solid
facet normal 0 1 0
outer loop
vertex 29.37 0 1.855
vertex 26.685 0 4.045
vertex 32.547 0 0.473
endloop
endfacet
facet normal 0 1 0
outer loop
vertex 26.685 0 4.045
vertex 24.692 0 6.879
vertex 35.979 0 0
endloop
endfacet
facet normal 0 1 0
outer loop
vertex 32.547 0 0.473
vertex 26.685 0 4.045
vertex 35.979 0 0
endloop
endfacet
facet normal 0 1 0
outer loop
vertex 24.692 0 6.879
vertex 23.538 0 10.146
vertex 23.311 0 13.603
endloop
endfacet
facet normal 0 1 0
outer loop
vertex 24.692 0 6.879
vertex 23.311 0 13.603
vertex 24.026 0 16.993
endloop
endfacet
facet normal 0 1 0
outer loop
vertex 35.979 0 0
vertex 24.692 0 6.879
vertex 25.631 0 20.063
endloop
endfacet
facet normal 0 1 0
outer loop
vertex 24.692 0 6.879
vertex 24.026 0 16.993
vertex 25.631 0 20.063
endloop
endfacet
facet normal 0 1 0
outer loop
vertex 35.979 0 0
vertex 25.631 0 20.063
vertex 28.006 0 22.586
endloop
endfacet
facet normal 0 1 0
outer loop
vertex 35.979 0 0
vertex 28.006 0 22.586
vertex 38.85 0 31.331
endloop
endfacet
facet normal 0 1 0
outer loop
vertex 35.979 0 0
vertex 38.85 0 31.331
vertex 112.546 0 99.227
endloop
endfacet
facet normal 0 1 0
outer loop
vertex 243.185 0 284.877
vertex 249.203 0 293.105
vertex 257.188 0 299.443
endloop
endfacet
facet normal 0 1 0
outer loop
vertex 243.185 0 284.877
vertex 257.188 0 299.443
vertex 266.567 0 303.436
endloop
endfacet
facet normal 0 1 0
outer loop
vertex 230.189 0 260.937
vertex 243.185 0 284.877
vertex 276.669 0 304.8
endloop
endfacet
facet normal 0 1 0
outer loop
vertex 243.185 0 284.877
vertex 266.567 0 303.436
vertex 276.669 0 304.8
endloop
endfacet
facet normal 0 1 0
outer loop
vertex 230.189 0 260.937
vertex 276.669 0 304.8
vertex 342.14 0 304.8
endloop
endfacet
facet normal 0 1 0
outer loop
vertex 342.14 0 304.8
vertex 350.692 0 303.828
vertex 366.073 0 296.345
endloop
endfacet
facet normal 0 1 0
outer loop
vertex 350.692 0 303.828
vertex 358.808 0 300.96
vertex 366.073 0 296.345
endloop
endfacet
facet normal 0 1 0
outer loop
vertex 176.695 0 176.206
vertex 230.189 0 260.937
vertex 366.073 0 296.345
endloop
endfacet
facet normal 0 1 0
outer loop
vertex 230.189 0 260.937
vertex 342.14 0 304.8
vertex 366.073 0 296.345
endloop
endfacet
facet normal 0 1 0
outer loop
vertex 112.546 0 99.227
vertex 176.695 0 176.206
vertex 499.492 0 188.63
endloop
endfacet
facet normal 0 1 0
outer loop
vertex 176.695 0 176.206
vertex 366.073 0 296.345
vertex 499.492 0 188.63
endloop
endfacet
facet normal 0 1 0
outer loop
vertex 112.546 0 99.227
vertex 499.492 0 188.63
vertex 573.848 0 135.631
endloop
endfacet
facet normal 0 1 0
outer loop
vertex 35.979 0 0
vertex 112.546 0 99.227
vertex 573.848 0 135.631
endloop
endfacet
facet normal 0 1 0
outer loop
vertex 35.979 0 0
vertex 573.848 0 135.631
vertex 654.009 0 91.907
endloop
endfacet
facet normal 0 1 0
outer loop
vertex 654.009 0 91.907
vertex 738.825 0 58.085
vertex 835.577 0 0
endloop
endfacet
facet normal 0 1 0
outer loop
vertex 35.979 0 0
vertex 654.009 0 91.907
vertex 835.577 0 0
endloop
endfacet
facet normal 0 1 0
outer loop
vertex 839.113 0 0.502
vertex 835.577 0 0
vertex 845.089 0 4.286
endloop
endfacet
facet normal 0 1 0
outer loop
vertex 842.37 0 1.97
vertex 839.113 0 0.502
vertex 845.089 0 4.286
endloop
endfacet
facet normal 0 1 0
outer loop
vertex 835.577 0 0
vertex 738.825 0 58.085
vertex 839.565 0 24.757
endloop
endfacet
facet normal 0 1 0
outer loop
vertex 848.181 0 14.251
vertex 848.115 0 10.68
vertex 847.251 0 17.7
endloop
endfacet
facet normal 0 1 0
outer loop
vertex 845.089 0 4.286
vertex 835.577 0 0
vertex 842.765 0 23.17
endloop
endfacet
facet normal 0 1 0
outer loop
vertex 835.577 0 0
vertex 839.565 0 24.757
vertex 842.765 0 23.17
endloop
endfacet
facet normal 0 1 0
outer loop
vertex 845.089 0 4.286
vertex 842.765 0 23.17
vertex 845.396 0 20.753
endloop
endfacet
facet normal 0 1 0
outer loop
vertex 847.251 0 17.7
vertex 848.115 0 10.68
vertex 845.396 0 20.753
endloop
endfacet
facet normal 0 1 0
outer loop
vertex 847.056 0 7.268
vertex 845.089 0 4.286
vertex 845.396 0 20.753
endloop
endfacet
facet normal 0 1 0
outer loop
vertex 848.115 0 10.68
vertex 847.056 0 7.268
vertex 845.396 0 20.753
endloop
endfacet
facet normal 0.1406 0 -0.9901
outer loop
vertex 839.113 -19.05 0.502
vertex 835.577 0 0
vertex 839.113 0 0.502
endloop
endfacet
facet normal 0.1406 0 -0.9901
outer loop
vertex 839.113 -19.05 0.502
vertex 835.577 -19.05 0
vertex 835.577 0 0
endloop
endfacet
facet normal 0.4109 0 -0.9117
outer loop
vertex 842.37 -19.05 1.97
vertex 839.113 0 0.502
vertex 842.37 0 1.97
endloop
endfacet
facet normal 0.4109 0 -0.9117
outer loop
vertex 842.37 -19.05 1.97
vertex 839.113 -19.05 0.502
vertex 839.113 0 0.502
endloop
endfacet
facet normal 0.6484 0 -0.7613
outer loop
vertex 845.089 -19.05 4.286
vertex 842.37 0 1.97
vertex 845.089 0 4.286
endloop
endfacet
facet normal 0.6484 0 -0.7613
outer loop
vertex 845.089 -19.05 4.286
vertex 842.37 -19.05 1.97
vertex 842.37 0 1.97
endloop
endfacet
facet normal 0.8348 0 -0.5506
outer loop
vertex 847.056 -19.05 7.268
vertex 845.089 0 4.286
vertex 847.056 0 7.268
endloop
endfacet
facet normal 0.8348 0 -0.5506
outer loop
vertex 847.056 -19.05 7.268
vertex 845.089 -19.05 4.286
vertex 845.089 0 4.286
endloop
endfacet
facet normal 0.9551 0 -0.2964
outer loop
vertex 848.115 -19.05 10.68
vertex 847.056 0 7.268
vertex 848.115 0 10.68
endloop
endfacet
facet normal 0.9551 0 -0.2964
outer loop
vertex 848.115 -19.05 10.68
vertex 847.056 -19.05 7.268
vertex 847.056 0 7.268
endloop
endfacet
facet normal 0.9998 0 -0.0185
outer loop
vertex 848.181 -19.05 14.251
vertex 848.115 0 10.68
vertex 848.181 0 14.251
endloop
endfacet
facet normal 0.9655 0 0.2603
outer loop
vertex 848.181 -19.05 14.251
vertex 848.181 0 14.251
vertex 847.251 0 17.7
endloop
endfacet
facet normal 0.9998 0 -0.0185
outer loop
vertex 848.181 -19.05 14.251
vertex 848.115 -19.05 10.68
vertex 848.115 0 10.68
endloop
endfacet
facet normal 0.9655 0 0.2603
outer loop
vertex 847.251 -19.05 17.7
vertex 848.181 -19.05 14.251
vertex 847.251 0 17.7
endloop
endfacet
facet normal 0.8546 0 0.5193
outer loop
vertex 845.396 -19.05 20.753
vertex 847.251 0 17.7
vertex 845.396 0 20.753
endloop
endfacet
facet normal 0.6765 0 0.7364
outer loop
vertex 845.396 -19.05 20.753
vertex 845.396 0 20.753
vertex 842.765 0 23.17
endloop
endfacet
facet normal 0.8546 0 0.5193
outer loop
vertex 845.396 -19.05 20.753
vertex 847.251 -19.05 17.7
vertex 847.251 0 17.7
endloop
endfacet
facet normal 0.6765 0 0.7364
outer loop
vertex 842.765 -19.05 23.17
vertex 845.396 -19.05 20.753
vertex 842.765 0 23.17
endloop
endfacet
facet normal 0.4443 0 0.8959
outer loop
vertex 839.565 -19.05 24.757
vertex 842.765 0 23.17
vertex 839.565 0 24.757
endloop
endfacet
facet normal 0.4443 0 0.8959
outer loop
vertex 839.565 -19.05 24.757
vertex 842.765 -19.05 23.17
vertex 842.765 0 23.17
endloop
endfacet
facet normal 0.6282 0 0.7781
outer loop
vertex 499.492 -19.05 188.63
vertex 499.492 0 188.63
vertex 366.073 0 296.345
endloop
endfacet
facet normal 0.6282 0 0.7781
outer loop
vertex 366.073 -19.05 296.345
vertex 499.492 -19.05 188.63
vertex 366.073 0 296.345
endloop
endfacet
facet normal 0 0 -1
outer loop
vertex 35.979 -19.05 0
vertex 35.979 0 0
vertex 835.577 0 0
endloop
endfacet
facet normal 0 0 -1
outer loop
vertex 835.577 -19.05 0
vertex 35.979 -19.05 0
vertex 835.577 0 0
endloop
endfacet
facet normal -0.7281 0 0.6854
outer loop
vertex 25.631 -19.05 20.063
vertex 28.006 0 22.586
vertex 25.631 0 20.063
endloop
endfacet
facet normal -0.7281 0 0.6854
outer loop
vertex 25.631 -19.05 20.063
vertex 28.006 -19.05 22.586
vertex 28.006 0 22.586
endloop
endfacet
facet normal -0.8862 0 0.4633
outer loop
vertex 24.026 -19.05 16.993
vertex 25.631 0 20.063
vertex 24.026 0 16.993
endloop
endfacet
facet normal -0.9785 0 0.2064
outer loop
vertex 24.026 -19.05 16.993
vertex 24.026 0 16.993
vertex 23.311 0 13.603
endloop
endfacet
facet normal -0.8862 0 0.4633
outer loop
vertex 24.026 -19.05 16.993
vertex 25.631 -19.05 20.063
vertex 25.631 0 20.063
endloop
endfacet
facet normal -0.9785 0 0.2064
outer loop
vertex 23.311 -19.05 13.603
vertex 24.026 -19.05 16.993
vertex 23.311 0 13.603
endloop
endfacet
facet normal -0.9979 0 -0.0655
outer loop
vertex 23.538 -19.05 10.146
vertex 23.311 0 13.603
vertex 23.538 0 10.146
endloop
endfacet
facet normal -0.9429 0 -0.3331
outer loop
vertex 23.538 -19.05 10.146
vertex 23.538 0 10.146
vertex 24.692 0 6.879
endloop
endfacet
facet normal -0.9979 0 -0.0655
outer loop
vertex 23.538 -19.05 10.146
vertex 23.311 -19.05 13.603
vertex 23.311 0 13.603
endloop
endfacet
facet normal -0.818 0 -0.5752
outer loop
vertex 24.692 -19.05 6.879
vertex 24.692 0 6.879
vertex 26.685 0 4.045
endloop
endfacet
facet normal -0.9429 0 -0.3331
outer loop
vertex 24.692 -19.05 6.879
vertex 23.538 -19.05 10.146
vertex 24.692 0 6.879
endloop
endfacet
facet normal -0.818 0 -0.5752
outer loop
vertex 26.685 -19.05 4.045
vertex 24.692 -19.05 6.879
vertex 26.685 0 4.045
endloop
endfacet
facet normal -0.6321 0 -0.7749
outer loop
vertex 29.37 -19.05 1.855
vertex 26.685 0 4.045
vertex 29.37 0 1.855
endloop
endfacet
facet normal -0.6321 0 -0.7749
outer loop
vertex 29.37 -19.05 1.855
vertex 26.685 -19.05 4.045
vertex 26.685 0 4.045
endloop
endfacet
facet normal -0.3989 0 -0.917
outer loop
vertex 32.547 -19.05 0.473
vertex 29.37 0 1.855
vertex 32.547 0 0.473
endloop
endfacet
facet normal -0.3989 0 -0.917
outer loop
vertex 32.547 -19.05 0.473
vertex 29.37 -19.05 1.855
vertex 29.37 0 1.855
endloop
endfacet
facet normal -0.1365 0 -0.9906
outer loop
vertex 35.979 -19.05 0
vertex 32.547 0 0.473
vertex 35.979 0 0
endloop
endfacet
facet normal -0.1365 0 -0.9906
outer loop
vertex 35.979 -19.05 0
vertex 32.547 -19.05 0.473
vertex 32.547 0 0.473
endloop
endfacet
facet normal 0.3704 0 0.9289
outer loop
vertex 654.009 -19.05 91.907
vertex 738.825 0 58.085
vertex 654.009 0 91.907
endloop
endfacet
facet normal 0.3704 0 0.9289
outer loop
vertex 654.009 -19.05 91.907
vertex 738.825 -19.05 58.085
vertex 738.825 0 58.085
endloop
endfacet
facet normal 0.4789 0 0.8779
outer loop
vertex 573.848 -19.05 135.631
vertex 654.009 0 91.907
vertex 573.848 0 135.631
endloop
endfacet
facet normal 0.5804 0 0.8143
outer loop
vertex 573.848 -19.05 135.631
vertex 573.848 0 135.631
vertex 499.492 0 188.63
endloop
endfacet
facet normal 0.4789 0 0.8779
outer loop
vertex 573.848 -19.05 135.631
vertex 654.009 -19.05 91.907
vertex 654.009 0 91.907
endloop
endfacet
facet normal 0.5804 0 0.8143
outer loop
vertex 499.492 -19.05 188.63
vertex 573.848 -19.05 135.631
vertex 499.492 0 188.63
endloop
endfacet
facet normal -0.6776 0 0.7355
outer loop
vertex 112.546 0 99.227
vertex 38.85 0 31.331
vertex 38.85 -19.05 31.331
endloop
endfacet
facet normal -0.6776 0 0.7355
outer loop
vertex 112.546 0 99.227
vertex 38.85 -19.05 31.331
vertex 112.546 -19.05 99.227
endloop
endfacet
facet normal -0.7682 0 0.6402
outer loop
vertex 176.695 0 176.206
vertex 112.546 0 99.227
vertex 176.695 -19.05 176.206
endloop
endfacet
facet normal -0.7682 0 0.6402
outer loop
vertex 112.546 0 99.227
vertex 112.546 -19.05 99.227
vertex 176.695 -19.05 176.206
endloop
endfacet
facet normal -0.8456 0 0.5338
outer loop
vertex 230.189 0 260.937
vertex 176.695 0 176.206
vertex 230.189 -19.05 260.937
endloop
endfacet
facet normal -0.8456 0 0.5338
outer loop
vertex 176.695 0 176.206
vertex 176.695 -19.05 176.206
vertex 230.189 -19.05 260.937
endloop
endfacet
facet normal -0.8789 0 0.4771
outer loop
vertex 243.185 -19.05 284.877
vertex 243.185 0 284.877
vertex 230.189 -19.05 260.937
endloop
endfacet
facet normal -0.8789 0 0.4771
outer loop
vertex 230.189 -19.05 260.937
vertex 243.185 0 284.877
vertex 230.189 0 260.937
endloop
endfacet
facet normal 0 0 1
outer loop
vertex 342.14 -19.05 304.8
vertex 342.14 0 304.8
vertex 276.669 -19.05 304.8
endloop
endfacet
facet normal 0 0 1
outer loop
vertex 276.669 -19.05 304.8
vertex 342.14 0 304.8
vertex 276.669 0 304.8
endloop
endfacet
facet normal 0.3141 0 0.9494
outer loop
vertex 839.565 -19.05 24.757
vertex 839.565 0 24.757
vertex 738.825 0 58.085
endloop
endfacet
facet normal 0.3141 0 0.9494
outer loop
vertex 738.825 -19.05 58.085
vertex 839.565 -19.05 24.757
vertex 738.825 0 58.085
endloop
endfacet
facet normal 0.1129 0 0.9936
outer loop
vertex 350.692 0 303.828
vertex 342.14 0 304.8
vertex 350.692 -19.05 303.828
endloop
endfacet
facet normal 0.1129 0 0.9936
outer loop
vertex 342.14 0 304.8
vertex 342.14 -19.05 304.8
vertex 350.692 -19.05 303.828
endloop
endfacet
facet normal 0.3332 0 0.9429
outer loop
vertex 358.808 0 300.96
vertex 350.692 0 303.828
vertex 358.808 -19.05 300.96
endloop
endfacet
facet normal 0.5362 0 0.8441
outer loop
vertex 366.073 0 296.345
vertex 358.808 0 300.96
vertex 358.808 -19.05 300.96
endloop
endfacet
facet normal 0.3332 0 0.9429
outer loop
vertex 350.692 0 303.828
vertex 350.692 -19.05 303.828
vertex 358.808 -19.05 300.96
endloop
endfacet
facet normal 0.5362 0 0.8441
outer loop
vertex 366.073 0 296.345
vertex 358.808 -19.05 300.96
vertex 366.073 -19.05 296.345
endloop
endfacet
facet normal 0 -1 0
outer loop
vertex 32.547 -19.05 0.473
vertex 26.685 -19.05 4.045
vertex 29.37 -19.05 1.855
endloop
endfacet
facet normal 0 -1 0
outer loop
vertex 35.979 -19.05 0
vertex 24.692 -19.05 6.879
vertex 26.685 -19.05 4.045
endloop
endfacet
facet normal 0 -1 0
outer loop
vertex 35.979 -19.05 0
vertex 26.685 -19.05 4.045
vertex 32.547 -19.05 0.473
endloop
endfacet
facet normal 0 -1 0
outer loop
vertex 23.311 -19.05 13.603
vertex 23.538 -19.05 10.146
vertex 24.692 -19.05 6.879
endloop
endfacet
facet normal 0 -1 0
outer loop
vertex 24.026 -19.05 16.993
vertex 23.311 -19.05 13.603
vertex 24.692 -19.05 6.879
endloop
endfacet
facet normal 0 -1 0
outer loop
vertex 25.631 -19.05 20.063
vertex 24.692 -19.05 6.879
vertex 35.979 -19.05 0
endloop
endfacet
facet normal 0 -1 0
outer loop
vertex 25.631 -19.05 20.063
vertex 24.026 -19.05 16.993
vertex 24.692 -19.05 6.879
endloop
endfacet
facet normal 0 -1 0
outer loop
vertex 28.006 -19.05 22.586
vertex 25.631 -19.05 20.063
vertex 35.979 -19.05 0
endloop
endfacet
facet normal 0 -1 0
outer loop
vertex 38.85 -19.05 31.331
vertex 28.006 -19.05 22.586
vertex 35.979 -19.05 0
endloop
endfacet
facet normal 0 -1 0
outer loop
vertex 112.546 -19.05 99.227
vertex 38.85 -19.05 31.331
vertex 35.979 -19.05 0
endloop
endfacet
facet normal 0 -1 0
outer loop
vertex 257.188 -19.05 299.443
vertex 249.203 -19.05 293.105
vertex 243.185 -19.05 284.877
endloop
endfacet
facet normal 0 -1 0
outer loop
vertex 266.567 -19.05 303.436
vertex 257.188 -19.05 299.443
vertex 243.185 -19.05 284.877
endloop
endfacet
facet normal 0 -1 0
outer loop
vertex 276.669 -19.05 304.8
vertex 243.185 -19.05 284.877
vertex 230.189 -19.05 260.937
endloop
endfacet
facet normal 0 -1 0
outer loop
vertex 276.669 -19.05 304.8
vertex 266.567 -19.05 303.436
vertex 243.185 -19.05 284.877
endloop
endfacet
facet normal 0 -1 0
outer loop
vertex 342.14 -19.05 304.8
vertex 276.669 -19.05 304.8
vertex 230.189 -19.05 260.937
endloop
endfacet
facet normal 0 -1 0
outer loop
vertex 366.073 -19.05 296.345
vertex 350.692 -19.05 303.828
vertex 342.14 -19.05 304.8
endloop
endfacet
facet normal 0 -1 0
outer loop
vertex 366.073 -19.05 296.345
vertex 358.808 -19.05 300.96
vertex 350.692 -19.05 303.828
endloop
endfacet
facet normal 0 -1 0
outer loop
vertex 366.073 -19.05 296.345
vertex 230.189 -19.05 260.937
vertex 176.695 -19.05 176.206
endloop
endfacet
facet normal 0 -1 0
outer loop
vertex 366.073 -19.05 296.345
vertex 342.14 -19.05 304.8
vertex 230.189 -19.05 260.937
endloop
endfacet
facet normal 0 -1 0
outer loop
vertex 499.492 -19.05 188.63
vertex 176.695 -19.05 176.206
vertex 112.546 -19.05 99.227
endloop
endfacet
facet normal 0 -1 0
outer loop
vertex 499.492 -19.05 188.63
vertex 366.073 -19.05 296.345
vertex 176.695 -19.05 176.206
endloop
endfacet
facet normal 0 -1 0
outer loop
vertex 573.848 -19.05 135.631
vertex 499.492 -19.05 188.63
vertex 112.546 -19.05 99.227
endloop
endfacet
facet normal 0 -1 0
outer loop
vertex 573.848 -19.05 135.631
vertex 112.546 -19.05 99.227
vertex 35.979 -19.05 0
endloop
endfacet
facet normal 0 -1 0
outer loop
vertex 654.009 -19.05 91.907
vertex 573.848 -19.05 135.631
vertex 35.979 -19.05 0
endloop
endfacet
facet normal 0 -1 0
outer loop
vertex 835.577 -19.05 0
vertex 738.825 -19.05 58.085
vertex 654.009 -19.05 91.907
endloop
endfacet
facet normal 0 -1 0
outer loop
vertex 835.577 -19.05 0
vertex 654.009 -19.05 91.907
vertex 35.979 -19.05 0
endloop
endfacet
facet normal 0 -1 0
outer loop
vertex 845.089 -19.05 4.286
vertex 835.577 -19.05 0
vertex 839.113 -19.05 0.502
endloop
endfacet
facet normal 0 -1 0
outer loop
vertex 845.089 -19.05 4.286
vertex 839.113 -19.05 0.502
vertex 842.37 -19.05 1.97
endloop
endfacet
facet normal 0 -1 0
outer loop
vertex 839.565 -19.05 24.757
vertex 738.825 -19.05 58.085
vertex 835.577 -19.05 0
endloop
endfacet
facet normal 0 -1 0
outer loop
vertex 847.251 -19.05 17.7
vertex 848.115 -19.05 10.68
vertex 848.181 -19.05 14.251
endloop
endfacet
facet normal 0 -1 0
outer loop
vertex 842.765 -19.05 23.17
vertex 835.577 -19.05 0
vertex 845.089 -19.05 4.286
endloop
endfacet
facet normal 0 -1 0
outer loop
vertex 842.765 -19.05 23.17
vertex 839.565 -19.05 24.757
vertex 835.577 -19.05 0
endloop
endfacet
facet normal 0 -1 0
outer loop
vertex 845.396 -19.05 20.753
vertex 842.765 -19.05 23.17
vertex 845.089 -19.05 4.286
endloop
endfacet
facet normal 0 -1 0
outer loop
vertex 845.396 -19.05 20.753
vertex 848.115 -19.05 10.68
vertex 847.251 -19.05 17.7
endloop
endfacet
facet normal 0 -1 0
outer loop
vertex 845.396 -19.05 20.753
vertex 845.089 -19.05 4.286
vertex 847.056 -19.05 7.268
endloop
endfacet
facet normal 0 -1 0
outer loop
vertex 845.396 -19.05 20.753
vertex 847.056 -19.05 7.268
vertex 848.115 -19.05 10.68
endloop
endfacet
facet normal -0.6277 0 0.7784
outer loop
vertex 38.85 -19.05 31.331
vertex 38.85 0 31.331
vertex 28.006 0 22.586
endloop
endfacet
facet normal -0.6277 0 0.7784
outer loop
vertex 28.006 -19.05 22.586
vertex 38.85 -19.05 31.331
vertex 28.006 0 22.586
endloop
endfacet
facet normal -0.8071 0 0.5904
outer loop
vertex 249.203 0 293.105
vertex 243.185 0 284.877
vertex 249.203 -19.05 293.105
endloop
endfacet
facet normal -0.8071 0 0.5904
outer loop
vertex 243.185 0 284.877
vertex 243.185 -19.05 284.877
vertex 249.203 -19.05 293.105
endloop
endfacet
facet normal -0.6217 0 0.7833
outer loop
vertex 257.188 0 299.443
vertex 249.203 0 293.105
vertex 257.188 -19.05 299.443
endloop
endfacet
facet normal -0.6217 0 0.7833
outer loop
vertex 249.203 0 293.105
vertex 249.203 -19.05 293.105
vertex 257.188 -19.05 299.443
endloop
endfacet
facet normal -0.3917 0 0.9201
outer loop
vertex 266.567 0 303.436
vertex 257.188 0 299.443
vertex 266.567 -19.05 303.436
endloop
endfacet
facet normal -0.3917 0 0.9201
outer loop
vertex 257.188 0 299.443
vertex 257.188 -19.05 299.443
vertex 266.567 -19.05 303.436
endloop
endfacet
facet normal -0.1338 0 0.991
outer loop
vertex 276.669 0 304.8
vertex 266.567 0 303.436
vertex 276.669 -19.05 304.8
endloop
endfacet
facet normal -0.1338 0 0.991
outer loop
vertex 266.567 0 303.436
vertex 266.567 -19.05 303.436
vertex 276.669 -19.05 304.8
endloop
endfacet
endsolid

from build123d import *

# Parameters (mm, degrees)
F1_DEPTH = 19.05
F2_R     = 762
F3_R     = 38.1
F4_R     = 12.7


with BuildPart() as f1:
    # F0 (on Front) → F1 (new body)
    with BuildSketch(Plane.XZ):
        Polygon((157.48, 127), (0, 0), (914.4, 0), (607.290909, 101.6), (355.6, 304.8), (254, 304.8), align=None)
    extrude(amount=F1_DEPTH)

    # F2
    f2_edges = [f1.edges().sort_by_distance(p)[0] for p in [
        (157.48, -9.525, 127),
        (607.290909, -9.525, 101.6),
    ]]
    fillet(f2_edges, radius=F2_R)

    # F3
    f3_edges = [f1.edges().sort_by_distance(p)[0] for p in [
        (254, -9.525, 304.8),
        (355.6, -9.525, 304.8),
    ]]
    fillet(f3_edges, radius=F3_R)

    # F4
    f4_edges = [f1.edges().sort_by_distance(p)[0] for p in [
        (914.4, -9.525, 0),
        (0, -9.525, 0),
    ]]
    fillet(f4_edges, radius=F4_R)


solid = f1.part
